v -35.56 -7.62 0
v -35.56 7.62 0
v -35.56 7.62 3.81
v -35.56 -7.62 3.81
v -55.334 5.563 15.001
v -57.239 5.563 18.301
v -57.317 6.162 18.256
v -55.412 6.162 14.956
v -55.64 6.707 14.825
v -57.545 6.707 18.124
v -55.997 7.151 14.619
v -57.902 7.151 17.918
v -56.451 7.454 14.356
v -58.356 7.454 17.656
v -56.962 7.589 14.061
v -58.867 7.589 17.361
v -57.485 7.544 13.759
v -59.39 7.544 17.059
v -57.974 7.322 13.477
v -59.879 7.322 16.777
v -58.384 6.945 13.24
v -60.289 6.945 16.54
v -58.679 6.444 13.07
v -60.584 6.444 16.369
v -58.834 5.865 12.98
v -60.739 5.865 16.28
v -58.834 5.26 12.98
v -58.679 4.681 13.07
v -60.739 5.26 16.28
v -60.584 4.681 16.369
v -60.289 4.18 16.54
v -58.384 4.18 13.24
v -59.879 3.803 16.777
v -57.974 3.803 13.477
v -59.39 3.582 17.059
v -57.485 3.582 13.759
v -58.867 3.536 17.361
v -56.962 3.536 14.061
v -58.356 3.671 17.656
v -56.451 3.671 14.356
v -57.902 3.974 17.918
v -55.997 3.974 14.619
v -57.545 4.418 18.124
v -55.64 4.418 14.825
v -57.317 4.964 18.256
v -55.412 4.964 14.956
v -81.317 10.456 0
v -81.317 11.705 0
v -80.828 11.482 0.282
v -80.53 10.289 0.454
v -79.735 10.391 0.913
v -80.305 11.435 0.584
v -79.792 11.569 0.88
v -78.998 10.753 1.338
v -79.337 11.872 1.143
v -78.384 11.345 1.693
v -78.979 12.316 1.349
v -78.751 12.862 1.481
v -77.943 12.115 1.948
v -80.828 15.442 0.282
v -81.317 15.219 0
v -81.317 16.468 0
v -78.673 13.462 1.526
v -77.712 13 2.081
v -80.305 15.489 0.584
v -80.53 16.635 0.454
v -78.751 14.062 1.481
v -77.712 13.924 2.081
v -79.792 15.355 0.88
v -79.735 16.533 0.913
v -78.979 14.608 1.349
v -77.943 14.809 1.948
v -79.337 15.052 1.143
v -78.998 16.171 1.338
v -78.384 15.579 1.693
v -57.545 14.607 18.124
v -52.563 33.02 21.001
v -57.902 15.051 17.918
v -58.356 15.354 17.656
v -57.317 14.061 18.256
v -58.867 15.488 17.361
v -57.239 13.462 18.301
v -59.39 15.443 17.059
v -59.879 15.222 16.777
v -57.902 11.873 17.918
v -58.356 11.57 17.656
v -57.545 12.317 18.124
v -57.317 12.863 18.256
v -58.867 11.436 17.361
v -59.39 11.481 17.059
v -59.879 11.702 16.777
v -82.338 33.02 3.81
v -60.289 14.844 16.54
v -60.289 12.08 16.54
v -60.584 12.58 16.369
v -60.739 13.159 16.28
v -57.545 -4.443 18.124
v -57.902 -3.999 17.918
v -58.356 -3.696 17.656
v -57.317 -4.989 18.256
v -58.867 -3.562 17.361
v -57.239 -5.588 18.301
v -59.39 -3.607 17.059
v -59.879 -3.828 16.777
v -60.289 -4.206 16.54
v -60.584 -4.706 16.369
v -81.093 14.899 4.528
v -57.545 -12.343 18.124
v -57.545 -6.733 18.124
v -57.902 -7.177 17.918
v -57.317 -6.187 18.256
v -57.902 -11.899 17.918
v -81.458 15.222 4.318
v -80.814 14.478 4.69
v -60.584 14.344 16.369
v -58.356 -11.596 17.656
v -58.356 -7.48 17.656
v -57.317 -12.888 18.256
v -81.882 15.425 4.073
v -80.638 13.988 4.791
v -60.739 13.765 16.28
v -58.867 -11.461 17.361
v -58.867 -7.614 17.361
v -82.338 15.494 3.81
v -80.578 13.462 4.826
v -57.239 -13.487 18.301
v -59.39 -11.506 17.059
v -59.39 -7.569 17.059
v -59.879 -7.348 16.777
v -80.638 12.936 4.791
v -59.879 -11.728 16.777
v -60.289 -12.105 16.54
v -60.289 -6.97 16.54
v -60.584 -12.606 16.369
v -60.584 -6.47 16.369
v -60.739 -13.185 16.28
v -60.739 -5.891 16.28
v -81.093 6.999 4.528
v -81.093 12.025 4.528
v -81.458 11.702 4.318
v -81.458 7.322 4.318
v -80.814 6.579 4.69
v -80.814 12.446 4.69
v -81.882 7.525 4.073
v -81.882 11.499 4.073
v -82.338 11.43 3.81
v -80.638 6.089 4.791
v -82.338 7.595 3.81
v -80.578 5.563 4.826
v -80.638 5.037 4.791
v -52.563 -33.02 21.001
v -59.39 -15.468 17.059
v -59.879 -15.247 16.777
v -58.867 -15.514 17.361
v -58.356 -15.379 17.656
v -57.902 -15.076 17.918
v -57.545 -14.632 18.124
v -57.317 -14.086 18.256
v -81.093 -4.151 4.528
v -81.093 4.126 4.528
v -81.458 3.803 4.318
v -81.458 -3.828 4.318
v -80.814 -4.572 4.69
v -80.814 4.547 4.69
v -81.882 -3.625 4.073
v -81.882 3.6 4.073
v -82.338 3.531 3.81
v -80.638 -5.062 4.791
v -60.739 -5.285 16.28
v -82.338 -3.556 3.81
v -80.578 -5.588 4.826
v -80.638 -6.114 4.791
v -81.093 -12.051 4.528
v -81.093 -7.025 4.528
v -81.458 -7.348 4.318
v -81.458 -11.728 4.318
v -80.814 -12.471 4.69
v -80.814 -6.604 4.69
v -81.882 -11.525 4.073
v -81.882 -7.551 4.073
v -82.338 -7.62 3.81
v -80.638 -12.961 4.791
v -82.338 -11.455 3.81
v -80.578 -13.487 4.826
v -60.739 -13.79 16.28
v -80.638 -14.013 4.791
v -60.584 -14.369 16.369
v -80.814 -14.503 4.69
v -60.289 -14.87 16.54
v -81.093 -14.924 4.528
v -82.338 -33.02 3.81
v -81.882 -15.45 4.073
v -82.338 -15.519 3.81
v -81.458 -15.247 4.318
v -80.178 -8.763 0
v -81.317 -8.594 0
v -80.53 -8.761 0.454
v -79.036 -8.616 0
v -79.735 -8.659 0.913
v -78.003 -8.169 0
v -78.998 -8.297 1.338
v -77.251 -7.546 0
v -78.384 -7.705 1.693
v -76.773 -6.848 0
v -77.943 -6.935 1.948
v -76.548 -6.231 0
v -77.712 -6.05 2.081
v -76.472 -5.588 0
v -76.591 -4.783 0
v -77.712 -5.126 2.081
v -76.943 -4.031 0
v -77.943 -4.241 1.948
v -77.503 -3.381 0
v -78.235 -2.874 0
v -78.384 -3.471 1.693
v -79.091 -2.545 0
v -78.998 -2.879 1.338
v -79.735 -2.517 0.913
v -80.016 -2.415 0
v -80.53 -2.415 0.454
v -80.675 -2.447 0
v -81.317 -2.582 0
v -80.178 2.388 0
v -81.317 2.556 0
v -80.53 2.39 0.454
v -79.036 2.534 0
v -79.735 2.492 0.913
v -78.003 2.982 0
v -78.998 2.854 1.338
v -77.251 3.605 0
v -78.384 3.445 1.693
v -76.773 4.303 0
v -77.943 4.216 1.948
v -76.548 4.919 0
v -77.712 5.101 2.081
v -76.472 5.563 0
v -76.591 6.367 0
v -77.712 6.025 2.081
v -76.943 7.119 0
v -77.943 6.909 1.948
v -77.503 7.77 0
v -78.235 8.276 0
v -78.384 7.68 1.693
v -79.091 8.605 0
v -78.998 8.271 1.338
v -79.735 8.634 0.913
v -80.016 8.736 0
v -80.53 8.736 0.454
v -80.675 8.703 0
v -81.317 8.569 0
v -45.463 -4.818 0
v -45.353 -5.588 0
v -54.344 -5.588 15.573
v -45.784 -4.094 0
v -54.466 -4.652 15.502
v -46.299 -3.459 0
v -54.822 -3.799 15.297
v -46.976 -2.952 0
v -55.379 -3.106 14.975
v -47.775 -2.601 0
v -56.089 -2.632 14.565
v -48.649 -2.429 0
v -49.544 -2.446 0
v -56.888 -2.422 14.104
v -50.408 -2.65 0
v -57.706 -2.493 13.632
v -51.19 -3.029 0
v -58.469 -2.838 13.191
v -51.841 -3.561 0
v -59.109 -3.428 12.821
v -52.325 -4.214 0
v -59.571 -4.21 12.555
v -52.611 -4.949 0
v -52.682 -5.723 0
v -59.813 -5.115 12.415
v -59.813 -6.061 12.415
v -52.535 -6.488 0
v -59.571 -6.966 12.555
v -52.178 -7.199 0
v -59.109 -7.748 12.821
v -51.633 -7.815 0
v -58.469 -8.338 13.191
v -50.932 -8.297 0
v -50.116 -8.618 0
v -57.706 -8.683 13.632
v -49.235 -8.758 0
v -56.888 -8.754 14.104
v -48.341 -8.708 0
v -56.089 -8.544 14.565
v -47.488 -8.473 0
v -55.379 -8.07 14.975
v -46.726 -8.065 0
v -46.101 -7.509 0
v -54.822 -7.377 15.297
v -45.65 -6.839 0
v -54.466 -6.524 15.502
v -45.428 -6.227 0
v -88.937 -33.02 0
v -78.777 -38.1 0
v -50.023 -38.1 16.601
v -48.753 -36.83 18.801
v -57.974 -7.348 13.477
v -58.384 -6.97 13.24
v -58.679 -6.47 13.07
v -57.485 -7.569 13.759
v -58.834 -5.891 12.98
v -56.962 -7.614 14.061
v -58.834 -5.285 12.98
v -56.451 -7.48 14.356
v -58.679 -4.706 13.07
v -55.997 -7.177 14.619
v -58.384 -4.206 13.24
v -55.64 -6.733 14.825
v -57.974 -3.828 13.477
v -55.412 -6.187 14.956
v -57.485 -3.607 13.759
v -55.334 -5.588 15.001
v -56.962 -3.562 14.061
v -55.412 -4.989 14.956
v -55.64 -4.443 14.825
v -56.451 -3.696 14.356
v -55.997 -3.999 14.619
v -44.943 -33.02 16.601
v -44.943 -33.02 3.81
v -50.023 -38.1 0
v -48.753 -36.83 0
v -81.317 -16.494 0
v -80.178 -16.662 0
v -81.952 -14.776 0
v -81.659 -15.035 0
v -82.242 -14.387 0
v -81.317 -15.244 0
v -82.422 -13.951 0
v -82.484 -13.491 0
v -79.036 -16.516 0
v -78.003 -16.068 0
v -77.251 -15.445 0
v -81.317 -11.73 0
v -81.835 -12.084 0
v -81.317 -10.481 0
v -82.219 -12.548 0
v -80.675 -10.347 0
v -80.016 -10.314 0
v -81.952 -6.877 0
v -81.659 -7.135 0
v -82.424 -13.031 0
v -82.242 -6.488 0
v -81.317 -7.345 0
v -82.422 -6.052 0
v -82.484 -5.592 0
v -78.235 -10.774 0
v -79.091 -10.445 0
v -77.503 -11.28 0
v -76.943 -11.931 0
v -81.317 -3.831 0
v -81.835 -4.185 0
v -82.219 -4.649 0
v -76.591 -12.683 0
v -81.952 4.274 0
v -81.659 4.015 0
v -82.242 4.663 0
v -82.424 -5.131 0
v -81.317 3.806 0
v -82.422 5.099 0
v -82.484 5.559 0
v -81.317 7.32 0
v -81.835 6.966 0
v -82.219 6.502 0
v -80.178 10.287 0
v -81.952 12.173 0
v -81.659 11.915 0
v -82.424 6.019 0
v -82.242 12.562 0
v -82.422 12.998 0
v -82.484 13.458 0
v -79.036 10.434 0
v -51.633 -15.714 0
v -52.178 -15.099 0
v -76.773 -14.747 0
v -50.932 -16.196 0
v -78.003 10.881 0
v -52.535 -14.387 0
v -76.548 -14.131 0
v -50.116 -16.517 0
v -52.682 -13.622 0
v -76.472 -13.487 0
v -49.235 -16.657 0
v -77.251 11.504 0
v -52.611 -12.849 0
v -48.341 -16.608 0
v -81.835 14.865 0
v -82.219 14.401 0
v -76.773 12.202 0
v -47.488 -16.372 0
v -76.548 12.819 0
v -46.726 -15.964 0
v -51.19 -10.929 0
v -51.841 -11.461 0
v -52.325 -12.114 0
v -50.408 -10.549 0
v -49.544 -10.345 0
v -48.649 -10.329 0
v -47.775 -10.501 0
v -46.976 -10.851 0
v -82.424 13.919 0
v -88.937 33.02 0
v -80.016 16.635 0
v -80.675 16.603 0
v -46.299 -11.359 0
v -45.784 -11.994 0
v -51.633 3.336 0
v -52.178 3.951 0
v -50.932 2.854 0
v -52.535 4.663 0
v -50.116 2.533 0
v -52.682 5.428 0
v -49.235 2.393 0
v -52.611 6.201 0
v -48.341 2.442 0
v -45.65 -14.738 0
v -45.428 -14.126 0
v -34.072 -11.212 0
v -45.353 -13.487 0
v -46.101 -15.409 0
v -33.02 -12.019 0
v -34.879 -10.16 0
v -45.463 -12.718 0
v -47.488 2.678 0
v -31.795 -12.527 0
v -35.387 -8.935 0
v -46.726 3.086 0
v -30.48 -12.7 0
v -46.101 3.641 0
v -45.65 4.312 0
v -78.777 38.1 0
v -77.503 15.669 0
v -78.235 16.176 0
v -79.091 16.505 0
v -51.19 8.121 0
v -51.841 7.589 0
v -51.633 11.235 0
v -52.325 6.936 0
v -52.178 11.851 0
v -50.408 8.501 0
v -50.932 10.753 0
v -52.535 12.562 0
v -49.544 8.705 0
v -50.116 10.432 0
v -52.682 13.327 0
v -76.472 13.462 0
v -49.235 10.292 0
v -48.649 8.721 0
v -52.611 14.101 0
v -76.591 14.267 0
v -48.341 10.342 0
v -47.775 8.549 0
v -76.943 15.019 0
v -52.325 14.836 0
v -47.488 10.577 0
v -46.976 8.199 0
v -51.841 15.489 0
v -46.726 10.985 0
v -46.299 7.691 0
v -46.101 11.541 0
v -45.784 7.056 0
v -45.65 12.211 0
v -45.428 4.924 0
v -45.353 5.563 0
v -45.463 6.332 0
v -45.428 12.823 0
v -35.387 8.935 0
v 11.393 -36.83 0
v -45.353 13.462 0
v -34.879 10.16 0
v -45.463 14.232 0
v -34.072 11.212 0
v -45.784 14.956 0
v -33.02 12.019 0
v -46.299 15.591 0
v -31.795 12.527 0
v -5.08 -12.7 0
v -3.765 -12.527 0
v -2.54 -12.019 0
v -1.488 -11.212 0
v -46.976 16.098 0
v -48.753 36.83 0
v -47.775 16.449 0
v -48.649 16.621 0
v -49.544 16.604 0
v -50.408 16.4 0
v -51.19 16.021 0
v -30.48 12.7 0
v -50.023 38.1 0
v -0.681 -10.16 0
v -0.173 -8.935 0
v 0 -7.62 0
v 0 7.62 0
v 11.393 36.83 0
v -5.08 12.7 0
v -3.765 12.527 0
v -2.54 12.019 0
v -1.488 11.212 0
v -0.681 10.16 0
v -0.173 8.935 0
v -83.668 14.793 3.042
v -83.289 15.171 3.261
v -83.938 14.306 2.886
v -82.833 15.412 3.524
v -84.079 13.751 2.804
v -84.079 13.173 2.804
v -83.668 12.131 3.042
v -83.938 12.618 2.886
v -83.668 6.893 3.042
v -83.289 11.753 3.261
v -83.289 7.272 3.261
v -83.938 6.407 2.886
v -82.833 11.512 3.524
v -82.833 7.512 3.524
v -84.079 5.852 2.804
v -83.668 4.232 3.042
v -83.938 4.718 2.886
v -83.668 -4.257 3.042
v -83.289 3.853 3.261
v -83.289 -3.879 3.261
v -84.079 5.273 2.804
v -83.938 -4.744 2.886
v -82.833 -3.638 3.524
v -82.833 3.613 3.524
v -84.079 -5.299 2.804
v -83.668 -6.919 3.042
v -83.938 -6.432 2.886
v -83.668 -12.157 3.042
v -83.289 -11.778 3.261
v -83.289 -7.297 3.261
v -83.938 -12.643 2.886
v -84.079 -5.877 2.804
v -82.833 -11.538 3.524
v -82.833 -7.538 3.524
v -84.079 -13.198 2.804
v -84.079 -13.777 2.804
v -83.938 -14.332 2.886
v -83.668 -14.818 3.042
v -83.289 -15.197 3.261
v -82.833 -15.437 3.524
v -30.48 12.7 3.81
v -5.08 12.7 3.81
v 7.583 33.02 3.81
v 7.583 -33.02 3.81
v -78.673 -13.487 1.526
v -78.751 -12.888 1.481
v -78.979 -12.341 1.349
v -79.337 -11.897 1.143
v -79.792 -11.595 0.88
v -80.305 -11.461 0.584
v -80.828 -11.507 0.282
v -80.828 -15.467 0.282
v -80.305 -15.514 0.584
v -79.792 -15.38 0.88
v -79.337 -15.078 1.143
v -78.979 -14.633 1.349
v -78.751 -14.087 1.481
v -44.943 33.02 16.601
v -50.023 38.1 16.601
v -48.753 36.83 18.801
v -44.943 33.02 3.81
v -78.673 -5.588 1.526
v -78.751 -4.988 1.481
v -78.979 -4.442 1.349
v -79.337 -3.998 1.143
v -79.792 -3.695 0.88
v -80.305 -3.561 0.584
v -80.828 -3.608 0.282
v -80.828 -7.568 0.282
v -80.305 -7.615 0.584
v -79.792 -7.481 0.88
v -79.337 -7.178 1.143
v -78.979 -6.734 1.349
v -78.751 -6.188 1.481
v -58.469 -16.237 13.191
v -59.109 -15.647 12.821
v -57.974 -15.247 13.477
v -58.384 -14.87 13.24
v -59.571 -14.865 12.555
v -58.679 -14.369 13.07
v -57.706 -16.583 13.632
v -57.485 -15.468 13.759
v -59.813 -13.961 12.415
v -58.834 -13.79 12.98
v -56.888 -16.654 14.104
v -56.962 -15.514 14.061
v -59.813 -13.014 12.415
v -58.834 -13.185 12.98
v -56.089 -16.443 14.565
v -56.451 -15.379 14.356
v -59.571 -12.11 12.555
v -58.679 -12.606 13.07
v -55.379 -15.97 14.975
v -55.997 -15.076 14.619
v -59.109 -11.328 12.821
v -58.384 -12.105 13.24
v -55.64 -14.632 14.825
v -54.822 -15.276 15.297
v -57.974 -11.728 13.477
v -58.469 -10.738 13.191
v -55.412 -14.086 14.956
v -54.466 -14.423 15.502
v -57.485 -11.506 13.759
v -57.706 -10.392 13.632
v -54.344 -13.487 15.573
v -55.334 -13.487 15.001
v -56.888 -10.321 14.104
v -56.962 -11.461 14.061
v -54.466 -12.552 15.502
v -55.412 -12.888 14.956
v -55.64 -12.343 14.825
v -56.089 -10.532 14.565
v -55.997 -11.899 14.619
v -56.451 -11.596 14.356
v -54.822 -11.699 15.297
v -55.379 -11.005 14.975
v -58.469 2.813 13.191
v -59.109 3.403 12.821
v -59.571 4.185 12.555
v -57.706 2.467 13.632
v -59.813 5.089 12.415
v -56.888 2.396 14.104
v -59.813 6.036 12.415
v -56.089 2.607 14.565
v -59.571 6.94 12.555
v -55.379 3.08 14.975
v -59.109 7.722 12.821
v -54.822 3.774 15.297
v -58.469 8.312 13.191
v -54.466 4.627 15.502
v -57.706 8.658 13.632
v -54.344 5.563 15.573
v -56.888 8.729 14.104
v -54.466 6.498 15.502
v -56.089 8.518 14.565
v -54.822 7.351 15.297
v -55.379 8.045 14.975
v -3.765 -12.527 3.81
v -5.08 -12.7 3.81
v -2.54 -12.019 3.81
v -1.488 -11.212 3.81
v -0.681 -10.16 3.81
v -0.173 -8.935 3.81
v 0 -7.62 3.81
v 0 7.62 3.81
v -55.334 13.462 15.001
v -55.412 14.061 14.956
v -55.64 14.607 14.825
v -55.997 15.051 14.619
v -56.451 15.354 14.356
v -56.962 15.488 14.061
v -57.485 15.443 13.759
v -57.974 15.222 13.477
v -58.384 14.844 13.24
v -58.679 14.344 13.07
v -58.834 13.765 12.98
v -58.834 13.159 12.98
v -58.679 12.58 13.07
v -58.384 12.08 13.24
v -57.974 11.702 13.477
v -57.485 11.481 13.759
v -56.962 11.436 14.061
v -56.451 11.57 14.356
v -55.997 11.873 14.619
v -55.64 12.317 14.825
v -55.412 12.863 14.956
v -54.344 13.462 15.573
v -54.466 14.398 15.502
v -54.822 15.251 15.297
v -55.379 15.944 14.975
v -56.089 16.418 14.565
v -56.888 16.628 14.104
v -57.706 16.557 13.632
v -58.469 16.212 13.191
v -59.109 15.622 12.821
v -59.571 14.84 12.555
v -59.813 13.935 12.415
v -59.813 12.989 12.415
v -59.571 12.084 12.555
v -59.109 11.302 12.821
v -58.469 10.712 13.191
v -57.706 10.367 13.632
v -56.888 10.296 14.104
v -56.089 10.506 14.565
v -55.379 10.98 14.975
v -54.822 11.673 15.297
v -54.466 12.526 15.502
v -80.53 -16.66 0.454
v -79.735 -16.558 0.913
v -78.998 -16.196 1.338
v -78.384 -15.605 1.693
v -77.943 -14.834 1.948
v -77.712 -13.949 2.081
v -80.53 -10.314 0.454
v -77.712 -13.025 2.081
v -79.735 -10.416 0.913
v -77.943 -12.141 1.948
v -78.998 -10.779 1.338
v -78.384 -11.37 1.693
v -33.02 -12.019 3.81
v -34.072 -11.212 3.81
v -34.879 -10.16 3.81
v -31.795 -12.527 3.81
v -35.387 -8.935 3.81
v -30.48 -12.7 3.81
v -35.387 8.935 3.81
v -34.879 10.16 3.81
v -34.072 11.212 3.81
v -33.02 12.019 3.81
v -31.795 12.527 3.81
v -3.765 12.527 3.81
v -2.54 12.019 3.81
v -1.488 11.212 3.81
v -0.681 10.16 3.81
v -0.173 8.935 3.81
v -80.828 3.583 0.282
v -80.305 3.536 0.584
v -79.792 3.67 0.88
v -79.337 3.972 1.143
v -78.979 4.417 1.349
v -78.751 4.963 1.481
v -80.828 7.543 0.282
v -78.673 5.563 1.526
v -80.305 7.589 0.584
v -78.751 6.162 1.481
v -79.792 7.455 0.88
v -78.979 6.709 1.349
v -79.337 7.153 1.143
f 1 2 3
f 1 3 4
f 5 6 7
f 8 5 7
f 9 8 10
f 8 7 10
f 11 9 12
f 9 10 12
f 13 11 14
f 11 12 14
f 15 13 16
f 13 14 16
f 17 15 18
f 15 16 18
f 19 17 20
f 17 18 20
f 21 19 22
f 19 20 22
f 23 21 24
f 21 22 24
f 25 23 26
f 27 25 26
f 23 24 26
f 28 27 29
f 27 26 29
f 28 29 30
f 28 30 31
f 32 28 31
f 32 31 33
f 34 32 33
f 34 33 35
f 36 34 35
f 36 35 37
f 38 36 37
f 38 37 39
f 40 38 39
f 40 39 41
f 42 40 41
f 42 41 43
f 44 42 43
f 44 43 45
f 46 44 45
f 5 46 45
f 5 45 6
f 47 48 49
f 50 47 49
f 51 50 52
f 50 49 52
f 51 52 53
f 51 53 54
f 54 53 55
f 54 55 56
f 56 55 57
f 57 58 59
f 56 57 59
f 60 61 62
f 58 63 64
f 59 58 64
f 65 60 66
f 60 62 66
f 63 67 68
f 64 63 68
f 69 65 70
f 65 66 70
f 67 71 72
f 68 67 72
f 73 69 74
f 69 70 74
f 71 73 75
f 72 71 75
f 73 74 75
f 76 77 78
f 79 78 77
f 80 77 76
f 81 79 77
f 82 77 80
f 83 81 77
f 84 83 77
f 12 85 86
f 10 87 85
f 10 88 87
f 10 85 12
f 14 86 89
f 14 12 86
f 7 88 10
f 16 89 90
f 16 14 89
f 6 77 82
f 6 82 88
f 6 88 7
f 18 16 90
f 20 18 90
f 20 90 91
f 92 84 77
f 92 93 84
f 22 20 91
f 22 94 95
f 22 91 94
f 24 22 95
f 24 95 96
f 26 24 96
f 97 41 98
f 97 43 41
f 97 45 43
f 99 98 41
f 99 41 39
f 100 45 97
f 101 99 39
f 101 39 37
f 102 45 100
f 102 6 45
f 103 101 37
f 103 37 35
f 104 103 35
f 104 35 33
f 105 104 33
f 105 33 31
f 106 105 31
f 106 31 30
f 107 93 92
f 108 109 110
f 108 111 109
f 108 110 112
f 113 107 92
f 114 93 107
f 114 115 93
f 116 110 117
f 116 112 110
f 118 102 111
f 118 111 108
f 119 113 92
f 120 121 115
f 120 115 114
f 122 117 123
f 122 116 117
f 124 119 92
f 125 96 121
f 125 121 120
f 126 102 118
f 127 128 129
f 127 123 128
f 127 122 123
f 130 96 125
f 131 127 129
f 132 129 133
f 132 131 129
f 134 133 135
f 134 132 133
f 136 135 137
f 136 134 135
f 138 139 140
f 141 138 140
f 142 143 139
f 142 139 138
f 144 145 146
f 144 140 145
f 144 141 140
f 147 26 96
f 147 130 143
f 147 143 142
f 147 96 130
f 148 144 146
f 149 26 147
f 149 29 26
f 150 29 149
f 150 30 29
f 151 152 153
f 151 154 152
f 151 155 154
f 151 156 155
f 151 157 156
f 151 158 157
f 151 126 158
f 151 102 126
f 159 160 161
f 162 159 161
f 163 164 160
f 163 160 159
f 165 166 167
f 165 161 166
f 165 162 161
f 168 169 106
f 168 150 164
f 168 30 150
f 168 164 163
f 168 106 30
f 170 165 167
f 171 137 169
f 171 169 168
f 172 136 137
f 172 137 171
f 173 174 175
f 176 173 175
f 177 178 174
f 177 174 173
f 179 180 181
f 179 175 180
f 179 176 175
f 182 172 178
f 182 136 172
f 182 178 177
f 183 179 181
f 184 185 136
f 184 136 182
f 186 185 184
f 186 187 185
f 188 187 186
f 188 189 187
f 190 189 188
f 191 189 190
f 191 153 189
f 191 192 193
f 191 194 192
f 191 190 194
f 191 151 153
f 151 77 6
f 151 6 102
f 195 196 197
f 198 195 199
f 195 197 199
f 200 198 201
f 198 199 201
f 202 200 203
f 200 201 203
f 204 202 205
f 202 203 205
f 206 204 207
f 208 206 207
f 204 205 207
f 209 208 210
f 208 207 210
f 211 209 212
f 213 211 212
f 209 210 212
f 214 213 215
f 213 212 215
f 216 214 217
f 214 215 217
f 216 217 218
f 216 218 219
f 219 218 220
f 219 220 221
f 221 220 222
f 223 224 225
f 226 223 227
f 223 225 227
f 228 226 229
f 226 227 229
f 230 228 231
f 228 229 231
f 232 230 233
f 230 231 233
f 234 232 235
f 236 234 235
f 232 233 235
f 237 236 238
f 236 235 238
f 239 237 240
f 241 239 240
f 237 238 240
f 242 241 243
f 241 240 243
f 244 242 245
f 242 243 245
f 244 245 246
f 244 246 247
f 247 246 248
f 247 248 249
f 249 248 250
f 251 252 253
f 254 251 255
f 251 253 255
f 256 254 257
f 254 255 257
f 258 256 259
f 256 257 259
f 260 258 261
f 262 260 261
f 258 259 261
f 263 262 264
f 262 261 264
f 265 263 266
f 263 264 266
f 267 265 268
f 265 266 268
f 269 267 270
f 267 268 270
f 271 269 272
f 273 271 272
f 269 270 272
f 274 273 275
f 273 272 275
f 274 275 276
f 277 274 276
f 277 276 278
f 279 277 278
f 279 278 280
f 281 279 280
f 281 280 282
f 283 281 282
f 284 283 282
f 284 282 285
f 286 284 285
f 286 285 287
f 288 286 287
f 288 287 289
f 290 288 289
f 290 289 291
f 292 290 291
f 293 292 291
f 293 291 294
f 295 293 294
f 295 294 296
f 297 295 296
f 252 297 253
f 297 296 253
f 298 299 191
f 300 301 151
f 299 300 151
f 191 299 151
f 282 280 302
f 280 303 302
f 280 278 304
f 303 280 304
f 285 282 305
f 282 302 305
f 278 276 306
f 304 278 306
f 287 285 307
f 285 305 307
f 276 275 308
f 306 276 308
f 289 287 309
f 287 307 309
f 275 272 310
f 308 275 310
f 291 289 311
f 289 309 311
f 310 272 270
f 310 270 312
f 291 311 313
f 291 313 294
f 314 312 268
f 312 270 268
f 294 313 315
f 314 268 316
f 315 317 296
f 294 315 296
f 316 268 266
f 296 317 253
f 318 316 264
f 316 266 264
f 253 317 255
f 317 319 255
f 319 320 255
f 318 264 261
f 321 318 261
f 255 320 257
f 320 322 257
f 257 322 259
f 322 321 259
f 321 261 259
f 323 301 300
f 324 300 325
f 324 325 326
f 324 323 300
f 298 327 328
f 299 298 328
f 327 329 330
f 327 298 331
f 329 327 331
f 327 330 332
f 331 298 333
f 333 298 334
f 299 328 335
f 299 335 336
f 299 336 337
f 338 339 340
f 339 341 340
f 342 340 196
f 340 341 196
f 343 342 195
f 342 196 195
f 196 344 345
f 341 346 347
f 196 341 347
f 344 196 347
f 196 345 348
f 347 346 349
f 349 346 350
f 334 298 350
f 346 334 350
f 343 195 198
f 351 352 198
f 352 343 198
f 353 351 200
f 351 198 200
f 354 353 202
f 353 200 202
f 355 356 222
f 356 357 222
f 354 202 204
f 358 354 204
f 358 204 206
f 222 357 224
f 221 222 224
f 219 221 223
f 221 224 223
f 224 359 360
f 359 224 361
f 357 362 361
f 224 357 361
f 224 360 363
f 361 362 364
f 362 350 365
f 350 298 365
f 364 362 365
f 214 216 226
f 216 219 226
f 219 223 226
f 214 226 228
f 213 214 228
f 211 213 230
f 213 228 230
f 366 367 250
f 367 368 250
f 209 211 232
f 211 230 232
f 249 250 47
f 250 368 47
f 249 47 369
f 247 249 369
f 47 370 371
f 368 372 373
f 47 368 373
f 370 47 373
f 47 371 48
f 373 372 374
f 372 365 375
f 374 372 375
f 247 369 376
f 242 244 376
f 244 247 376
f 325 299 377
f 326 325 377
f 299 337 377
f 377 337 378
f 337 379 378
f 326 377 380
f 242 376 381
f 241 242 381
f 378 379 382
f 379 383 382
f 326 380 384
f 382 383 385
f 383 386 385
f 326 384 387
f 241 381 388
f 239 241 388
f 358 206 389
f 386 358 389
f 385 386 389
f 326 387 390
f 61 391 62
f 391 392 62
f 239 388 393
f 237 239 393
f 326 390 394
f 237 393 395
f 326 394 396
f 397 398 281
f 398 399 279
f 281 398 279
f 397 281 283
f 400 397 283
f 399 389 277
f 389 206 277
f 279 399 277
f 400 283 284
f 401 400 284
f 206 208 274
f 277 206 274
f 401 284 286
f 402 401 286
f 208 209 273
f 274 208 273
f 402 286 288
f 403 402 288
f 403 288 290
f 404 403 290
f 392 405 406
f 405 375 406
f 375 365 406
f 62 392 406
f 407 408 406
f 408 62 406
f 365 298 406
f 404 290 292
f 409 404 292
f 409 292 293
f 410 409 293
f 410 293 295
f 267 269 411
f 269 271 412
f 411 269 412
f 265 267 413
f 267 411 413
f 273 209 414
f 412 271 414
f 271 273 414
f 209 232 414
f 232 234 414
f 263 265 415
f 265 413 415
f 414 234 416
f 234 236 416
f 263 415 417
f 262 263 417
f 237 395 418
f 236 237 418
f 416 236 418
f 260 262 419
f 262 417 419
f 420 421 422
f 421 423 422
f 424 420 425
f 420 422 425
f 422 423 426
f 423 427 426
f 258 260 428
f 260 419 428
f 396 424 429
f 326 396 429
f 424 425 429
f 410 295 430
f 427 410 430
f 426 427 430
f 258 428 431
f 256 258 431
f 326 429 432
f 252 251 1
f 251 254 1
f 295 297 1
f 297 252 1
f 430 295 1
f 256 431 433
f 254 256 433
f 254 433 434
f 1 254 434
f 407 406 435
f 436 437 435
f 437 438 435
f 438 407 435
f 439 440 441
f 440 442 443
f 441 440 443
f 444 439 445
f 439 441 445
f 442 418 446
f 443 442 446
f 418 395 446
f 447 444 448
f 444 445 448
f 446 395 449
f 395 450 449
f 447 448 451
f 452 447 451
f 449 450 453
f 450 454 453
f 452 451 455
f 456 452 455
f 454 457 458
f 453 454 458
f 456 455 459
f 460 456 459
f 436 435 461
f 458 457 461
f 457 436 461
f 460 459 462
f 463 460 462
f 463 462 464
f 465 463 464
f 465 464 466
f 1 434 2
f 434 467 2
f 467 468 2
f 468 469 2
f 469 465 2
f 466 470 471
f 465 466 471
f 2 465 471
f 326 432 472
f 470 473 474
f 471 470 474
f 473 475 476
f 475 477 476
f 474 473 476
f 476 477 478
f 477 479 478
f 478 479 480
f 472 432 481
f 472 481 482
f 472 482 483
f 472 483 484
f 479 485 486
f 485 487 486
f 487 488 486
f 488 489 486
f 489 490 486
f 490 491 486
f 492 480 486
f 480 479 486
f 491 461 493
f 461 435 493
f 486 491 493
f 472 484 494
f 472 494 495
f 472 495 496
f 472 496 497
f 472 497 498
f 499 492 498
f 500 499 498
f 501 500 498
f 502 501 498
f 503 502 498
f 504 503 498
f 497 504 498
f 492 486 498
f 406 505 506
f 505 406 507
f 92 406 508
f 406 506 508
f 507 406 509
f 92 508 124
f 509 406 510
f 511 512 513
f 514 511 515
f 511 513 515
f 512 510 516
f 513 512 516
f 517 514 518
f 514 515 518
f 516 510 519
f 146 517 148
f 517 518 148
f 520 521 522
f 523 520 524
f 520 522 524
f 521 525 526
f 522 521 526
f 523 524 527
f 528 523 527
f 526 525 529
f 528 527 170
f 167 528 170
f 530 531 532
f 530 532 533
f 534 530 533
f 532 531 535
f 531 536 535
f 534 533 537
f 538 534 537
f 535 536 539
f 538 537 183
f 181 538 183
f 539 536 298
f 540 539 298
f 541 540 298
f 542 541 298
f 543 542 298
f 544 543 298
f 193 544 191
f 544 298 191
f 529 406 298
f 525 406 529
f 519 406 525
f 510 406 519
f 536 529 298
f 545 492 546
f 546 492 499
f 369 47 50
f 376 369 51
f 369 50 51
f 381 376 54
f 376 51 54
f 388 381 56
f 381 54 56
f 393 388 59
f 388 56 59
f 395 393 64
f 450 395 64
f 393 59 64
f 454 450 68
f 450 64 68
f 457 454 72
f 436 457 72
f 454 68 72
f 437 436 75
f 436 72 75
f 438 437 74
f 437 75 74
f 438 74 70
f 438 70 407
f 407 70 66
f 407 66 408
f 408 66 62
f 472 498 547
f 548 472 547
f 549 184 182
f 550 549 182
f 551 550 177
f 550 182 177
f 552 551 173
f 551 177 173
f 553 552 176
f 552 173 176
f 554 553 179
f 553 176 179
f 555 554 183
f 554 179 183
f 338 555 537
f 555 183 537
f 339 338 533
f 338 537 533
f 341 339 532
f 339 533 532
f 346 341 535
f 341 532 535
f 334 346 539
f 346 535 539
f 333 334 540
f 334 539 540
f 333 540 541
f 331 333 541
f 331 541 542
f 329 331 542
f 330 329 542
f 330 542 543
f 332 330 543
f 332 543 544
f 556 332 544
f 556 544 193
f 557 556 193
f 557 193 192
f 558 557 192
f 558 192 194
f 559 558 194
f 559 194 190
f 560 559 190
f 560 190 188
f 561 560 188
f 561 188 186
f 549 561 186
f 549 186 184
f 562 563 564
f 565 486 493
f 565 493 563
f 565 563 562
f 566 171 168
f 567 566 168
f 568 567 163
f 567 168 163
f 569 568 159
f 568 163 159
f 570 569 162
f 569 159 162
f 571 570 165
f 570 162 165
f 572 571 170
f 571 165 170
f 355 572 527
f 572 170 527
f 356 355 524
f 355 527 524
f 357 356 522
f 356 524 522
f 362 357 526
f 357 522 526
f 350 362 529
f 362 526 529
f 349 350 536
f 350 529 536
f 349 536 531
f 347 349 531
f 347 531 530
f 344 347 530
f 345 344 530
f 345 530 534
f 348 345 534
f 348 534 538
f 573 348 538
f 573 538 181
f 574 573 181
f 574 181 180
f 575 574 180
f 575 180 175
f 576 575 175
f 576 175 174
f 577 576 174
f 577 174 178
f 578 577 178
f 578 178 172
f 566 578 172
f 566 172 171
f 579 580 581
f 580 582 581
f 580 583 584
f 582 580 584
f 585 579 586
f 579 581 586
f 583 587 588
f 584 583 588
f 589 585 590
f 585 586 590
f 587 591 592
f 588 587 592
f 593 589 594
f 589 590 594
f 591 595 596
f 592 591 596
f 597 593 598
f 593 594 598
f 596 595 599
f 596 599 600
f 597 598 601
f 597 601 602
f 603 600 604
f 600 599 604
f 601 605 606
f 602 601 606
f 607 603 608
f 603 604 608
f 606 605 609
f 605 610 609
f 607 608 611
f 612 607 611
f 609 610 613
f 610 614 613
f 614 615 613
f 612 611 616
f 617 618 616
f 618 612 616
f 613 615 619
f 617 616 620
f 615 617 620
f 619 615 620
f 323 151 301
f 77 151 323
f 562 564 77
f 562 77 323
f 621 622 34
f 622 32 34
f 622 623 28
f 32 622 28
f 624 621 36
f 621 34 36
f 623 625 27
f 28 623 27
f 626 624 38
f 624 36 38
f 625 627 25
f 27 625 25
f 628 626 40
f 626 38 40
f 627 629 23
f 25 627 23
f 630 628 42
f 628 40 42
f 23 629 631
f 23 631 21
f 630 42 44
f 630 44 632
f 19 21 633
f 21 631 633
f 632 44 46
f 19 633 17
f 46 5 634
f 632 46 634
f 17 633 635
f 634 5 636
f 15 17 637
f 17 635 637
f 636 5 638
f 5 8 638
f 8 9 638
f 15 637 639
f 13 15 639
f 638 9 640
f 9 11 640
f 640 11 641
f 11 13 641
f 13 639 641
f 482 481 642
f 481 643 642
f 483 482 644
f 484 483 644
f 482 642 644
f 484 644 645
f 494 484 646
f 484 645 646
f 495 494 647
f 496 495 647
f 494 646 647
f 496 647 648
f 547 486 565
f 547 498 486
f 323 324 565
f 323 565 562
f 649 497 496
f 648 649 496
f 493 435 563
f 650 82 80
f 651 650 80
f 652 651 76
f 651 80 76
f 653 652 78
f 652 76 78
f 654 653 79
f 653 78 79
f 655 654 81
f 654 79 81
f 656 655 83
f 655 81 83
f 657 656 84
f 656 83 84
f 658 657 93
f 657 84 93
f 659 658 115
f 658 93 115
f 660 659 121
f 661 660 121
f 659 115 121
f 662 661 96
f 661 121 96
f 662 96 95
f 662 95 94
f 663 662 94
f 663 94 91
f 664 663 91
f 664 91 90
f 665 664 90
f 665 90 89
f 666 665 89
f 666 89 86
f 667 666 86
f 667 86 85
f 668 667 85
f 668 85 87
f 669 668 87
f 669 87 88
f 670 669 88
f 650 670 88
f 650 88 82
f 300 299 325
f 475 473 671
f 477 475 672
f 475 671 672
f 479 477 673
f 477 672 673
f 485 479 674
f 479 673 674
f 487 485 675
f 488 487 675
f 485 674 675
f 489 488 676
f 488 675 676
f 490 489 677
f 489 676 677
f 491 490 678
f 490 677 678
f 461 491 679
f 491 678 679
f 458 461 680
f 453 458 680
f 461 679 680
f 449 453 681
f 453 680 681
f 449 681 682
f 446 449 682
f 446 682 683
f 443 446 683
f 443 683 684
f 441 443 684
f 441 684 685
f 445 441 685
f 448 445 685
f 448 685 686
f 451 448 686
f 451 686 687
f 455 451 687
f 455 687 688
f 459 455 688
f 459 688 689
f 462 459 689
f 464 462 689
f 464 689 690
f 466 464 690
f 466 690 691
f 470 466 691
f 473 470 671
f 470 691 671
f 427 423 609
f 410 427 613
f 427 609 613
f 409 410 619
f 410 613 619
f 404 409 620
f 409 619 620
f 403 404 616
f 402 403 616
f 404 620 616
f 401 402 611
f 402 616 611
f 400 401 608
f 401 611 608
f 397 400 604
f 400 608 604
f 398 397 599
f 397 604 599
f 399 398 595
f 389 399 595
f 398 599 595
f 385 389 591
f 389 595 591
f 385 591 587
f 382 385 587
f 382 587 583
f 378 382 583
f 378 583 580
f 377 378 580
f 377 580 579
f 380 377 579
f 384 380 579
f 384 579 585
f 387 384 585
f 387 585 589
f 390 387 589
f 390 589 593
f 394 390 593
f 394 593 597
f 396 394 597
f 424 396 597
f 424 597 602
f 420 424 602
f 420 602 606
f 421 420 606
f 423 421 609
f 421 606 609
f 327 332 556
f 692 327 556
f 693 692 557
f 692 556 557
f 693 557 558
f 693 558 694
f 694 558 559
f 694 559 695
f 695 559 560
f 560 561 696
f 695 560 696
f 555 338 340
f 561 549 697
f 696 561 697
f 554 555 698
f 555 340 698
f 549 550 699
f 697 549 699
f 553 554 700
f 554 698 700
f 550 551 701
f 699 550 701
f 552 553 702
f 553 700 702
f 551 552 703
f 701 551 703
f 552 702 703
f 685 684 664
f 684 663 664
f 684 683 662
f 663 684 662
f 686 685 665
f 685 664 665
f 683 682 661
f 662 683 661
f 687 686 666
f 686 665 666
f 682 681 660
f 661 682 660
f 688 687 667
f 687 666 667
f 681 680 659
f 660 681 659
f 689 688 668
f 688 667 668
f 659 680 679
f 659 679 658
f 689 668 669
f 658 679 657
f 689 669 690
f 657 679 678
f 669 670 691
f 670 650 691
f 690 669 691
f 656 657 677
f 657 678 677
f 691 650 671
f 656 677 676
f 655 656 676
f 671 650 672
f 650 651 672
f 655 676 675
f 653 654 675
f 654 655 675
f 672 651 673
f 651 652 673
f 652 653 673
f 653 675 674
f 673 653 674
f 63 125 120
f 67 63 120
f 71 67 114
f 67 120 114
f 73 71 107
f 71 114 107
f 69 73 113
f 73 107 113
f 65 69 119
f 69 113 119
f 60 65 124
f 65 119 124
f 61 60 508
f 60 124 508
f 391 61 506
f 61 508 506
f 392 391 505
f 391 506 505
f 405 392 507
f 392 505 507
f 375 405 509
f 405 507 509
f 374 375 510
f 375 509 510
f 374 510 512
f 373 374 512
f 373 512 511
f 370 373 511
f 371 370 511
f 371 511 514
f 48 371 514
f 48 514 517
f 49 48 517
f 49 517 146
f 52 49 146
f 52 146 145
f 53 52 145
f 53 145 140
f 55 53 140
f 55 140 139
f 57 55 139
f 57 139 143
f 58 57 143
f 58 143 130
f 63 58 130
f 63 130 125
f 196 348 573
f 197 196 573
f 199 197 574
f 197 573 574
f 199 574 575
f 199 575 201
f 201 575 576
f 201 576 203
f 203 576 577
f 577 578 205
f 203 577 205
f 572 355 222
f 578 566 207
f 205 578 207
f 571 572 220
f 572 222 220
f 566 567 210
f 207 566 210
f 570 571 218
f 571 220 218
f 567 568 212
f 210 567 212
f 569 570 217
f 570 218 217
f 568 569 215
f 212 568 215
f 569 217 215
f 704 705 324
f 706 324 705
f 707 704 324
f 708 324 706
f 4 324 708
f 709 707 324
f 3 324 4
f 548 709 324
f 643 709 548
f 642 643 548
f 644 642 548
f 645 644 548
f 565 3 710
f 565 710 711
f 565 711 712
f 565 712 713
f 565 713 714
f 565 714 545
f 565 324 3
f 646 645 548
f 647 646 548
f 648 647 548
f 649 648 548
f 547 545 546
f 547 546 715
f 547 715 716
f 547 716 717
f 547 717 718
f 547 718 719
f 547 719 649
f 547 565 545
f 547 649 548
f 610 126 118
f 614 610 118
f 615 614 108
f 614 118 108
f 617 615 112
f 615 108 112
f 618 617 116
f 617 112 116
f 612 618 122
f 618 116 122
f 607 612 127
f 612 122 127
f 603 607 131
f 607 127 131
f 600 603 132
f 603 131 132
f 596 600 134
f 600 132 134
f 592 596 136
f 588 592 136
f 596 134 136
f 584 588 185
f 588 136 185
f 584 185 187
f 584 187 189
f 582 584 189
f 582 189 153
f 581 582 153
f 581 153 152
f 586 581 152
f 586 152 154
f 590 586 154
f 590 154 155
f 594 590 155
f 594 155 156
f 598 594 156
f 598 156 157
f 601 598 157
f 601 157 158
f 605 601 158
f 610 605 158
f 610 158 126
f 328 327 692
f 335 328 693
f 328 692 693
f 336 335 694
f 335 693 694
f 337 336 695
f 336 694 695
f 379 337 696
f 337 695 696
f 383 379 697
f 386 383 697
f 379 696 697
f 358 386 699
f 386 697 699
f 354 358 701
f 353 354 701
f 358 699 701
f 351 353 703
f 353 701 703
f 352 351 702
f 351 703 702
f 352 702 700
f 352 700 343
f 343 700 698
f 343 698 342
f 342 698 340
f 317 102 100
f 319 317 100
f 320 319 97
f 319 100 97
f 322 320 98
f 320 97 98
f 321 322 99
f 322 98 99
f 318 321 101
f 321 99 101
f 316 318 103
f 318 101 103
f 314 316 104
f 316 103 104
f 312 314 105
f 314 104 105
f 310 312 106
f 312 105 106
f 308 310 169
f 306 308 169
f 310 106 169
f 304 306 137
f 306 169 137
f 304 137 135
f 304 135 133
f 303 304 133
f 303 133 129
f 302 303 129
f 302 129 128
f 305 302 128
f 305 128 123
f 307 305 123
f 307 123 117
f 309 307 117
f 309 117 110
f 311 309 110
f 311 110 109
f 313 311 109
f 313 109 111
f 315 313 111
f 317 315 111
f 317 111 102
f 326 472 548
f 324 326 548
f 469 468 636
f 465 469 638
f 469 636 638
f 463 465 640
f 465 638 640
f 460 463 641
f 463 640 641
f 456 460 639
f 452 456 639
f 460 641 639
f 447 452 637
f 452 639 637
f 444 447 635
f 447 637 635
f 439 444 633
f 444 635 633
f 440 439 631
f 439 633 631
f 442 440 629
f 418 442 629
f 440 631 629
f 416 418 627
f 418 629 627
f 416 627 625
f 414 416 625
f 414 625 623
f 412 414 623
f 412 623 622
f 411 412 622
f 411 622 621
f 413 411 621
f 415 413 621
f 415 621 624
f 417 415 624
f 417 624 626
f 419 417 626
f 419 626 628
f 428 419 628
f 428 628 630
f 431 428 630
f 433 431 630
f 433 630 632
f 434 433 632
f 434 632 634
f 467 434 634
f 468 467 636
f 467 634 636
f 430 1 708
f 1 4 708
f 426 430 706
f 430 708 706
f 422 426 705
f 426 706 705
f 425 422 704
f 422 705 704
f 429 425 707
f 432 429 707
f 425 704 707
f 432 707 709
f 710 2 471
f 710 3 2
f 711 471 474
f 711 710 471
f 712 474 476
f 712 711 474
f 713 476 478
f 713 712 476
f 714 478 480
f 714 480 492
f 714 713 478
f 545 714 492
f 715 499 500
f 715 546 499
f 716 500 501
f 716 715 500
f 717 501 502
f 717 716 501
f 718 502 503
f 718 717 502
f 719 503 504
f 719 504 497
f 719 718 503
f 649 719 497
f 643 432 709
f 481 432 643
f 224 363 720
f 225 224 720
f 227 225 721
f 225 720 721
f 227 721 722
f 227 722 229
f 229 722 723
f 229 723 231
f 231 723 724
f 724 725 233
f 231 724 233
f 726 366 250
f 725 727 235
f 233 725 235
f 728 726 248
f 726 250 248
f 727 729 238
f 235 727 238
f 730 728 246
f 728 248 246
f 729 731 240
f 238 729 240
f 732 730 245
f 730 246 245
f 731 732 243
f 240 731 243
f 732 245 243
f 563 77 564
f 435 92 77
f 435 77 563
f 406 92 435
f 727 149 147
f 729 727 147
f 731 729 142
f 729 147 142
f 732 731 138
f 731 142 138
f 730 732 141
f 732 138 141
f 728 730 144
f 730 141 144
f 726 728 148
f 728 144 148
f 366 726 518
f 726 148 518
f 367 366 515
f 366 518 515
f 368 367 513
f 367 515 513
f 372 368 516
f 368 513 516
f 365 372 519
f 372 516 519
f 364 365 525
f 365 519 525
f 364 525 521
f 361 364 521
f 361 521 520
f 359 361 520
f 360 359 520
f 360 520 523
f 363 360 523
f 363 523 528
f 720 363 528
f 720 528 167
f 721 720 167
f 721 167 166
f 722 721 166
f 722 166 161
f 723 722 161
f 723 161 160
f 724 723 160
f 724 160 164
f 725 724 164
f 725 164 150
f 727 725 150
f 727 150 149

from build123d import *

# Parameters (mm, degrees)
F0_W          = 101.6
F0_H          = 76.2
F2_DEPTH      = 3.81
F3_DEPTH      = 38.1
F3_DEPTH_BACK = 38.1
F5_DEPTH      = 101.6
F6_R          = 2.032
F7_DEPTH      = 25.4
F9_R          = 3.175
F9_R_2        = 2.032
F10_DEPTH     = 25.4
F11_W         = 35.56
F11_H         = 25.4
F12_DEPTH     = 25.4
F13_T1_DEPTH  = 102.3282991577
F13_T3_DEPTH  = 70.6700590666
F13_T5_DEPTH  = 34.6541495789
F13_T11_DEPTH = 70.6700590666
F13_T16_DEPTH = 47.7182991577
F14_SIZE      = 5.08
F15_T1_DEPTH  = 71.0624204228
F15_T3_DEPTH  = 110.5507880402
F15_T5_DEPTH  = 71.0624204227
F16_R         = 5.08


# Not quite as in the source:
# - a fillet or chamfer that OpenCascade refuses, or shapes differently, is made with other operations: its cross-section is extruded or revolved along the edge and cut away or added


with BuildPart() as f2:
    # F0 (on Top) → F2 (new body)
    with BuildSketch(Plane.XY):
        with Locations((-38.1367237687, 0)):
            Rectangle(F0_W, F0_H)
    extrude(amount=F2_DEPTH)

    # F1 (on Front) → F3 (join, two sides)
    with BuildSketch(Plane.XZ) as f3_sk:
        Polygon((-44.9426332565, 25.4), (-88.9367237687, 0), (-44.9426332565, 0), align=None)
    extrude(amount=F3_DEPTH)
    extrude(f3_sk.sketch, amount=-F3_DEPTH_BACK)

    # F4 (on face) → F5 (cut)
    with BuildSketch(Plane.XZ.offset(38.1)):
        Polygon((-88.9367237687, 0), (-82.3376101919, 3.81), (-88.9367237687, 3.81), align=None)
    extrude(amount=-F5_DEPTH, mode=Mode.SUBTRACT)

    # F6 (on face) → F7 (cut)
    with BuildSketch(Plane(origin=(-22.2341809422, 0, 38.5107310565), x_dir=(0.8660254038, 0, 0.5), z_dir=(-0.5, 0, 0.8660254038))):
        with Locations((-69.4014621131, -13.4874)):
            Circle(F6_R)
        with Locations((-69.4014621131, -5.588)):
            Circle(F6_R)
        with Locations((-69.4014621131, 5.5626)):
            Circle(F6_R)
        with Locations((-69.4014621131, 13.462)):
            Circle(F6_R)
        with Locations((-42.4520621131, 13.462)):
            Circle(F6_R)
        with Locations((-42.4520621131, -5.588)):
            Circle(F6_R)
        with Locations((-42.4520621131, -13.4874)):
            Circle(F6_R)
        with Locations((-42.4520621131, 5.5626)):
            Circle(F6_R)
    extrude(amount=-F7_DEPTH, mode=Mode.SUBTRACT)

    # F9 (on offset) → F10 (cut)
    with BuildSketch(Plane(origin=(-20.3291809422, 0, 35.2111742681), x_dir=(0.8660254038, 0, 0.5), z_dir=(-0.5, 0, 0.8660254038))):
        with Locations((-69.4014621131, 13.462)):
            Circle(F9_R)
        with Locations((-69.4014621131, 13.462)):
            Circle(F9_R_2, mode=Mode.SUBTRACT)
        with Locations((-69.4014621131, 5.5626)):
            Circle(F9_R)
        with Locations((-69.4014621131, 5.5626)):
            Circle(F9_R_2, mode=Mode.SUBTRACT)
        with Locations((-69.4014621131, -5.588)):
            Circle(F9_R)
        with Locations((-69.4014621131, -5.588)):
            Circle(F9_R_2, mode=Mode.SUBTRACT)
        with Locations((-69.4014621131, -13.4874)):
            Circle(F9_R)
        with Locations((-69.4014621131, -13.4874)):
            Circle(F9_R_2, mode=Mode.SUBTRACT)
        with Locations((-42.4520621131, -5.588)):
            Circle(F9_R)
        with Locations((-42.4520621131, -5.588)):
            Circle(F9_R_2, mode=Mode.SUBTRACT)
        with Locations((-42.4520621131, -13.4874)):
            Circle(F9_R)
        with Locations((-42.4520621131, -13.4874)):
            Circle(F9_R_2, mode=Mode.SUBTRACT)
        with Locations((-42.4520621131, 5.5626)):
            Circle(F9_R)
        with Locations((-42.4520621131, 5.5626)):
            Circle(F9_R_2, mode=Mode.SUBTRACT)
        with Locations((-42.4520621131, 13.462)):
            Circle(F9_R)
        with Locations((-42.4520621131, 13.462)):
            Circle(F9_R_2, mode=Mode.SUBTRACT)
    extrude(amount=-F10_DEPTH, mode=Mode.SUBTRACT)

    # F11 (on face) → F12 (cut)
    with BuildSketch(Plane(origin=(0, 0, 0), x_dir=(1, 0, 0), z_dir=(0, 0, -1))):
        with Locations((-17.78, 0)):
            Rectangle(F11_W, F11_H)
    extrude(amount=-F12_DEPTH, mode=Mode.SUBTRACT)

    # F13: chamfer of 5.08 on 4 edges, made by hand

    # F13_s2 → F13_t1 (cut)
    with BuildSketch(Plane.XZ.offset(-51.1641495789)):
        Polygon((12.6632762313, -1.27), (7.5832762313, 3.81), (12.6632762313, 3.81), align=None)
    extrude(amount=F13_T1_DEPTH, mode=Mode.SUBTRACT)

    # F13_s4 → F13_t3 (cut)
    with BuildSketch(Plane.YZ.offset(-44.9426332565)):
        Polygon((-38.1, -1.27), (-33.02, 3.81), (-38.1, 3.81), align=None)
        Polygon((38.1, -1.27), (33.02, 3.81), (38.1, 3.81), align=None)
    extrude(amount=F13_T3_DEPTH, mode=Mode.SUBTRACT)

    # F13_s6 → F13_t5 (cut)
    with BuildSketch(Plane.XY.offset(3.81)):
        Polygon((-50.0226332565, 38.1), (-44.9426332565, 33.02), (-44.9426332565, 38.1), align=None)
    extrude(amount=F13_T5_DEPTH, mode=Mode.SUBTRACT)


with BuildPart() as f13_tool9:
    # F13_s10 → F13_t11 (new body)
    with BuildSketch(Plane.YZ.offset(12.6632762313)):
        Polygon((38.1, -1.27), (33.02, 3.81), (38.1, 3.81), align=None)
    extrude(amount=-F13_T11_DEPTH)

    split(bisect_by=Plane.XY, keep=Keep.TOP)

    split(bisect_by=Plane.YZ.offset(-44.9426332565), keep=Keep.BOTTOM)


with BuildPart() as f13_tool14:
    # F13_s15 → F13_t16 (new body)
    with BuildSketch(Plane.XY.offset(-9.2541495789)):
        Polygon((-50.0226332565, 38.1), (-44.9426332565, 33.02), (-44.9426332565, 38.1), align=None)
    extrude(amount=F13_T16_DEPTH)

    split(bisect_by=Plane.XY, keep=Keep.TOP)

    split(bisect_by=Plane.XY.offset(3.81), keep=Keep.BOTTOM)


with BuildPart() as f13_tool9_1:
    add(f13_tool9.part)

    # F13_t19: intersect F13_tool14
    add(f13_tool14.part, mode=Mode.INTERSECT)


with BuildPart() as f2_1:
    add(f2.part)

    # F13_t7: cut F13_tool9
    add(f13_tool9_1.part, mode=Mode.SUBTRACT)

    # F14
    f14_edges = [f2_1.edges().sort_by_distance(p)[0] for p in [
        (-44.942633, -38.1, 12.7),
    ]]
    chamfer(f14_edges, length=F14_SIZE)

    # F15: chamfer of 5.08 on 3 edges, made by hand

    # F15_s2 → F15_t1 (cut)
    with BuildSketch(Plane(origin=(-16.4745669001, 0, -9.5115956346), x_dir=(0, 1, 0), z_dir=(-0.8660254038, 0, -0.5))):
        Polygon((-38.1, -39.3883618844), (-33.02, -44.4683618844), (-38.1, -44.4683618844), align=None)
    extrude(amount=F15_T1_DEPTH, mode=Mode.SUBTRACT)

    # F15_s4 → F15_t3 (cut)
    with BuildSketch(Plane.XZ.offset(-55.2753940201)):
        Polygon((-52.5626332565, 21.0005909488), (-44.9426332565, 16.6011818976), (-44.9426332565, 25.4), align=None)
    extrude(amount=F15_T3_DEPTH, mode=Mode.SUBTRACT)

    # F15_s6 → F15_t5 (cut)
    with BuildSketch(Plane(origin=(-78.0164282407, 0, -45.042805846), x_dir=(0, 1, 0), z_dir=(0.8660254038, 0, 0.5))):
        Polygon((33.02, 44.4683618844), (38.1, 39.3883618844), (38.1, 44.4683618844), align=None)
    extrude(amount=F15_T5_DEPTH, mode=Mode.SUBTRACT)

    # F16
    f16_edges = [f2_1.edges().sort_by_distance(p)[0] for p in [
        (-35.56, -12.7, 1.905),
        (-35.56, 12.7, 1.905),
        (0, 12.7, 1.905),
        (0, -12.7, 1.905),
    ]]
    fillet(f16_edges, radius=F16_R)


solid = f2_1.part
